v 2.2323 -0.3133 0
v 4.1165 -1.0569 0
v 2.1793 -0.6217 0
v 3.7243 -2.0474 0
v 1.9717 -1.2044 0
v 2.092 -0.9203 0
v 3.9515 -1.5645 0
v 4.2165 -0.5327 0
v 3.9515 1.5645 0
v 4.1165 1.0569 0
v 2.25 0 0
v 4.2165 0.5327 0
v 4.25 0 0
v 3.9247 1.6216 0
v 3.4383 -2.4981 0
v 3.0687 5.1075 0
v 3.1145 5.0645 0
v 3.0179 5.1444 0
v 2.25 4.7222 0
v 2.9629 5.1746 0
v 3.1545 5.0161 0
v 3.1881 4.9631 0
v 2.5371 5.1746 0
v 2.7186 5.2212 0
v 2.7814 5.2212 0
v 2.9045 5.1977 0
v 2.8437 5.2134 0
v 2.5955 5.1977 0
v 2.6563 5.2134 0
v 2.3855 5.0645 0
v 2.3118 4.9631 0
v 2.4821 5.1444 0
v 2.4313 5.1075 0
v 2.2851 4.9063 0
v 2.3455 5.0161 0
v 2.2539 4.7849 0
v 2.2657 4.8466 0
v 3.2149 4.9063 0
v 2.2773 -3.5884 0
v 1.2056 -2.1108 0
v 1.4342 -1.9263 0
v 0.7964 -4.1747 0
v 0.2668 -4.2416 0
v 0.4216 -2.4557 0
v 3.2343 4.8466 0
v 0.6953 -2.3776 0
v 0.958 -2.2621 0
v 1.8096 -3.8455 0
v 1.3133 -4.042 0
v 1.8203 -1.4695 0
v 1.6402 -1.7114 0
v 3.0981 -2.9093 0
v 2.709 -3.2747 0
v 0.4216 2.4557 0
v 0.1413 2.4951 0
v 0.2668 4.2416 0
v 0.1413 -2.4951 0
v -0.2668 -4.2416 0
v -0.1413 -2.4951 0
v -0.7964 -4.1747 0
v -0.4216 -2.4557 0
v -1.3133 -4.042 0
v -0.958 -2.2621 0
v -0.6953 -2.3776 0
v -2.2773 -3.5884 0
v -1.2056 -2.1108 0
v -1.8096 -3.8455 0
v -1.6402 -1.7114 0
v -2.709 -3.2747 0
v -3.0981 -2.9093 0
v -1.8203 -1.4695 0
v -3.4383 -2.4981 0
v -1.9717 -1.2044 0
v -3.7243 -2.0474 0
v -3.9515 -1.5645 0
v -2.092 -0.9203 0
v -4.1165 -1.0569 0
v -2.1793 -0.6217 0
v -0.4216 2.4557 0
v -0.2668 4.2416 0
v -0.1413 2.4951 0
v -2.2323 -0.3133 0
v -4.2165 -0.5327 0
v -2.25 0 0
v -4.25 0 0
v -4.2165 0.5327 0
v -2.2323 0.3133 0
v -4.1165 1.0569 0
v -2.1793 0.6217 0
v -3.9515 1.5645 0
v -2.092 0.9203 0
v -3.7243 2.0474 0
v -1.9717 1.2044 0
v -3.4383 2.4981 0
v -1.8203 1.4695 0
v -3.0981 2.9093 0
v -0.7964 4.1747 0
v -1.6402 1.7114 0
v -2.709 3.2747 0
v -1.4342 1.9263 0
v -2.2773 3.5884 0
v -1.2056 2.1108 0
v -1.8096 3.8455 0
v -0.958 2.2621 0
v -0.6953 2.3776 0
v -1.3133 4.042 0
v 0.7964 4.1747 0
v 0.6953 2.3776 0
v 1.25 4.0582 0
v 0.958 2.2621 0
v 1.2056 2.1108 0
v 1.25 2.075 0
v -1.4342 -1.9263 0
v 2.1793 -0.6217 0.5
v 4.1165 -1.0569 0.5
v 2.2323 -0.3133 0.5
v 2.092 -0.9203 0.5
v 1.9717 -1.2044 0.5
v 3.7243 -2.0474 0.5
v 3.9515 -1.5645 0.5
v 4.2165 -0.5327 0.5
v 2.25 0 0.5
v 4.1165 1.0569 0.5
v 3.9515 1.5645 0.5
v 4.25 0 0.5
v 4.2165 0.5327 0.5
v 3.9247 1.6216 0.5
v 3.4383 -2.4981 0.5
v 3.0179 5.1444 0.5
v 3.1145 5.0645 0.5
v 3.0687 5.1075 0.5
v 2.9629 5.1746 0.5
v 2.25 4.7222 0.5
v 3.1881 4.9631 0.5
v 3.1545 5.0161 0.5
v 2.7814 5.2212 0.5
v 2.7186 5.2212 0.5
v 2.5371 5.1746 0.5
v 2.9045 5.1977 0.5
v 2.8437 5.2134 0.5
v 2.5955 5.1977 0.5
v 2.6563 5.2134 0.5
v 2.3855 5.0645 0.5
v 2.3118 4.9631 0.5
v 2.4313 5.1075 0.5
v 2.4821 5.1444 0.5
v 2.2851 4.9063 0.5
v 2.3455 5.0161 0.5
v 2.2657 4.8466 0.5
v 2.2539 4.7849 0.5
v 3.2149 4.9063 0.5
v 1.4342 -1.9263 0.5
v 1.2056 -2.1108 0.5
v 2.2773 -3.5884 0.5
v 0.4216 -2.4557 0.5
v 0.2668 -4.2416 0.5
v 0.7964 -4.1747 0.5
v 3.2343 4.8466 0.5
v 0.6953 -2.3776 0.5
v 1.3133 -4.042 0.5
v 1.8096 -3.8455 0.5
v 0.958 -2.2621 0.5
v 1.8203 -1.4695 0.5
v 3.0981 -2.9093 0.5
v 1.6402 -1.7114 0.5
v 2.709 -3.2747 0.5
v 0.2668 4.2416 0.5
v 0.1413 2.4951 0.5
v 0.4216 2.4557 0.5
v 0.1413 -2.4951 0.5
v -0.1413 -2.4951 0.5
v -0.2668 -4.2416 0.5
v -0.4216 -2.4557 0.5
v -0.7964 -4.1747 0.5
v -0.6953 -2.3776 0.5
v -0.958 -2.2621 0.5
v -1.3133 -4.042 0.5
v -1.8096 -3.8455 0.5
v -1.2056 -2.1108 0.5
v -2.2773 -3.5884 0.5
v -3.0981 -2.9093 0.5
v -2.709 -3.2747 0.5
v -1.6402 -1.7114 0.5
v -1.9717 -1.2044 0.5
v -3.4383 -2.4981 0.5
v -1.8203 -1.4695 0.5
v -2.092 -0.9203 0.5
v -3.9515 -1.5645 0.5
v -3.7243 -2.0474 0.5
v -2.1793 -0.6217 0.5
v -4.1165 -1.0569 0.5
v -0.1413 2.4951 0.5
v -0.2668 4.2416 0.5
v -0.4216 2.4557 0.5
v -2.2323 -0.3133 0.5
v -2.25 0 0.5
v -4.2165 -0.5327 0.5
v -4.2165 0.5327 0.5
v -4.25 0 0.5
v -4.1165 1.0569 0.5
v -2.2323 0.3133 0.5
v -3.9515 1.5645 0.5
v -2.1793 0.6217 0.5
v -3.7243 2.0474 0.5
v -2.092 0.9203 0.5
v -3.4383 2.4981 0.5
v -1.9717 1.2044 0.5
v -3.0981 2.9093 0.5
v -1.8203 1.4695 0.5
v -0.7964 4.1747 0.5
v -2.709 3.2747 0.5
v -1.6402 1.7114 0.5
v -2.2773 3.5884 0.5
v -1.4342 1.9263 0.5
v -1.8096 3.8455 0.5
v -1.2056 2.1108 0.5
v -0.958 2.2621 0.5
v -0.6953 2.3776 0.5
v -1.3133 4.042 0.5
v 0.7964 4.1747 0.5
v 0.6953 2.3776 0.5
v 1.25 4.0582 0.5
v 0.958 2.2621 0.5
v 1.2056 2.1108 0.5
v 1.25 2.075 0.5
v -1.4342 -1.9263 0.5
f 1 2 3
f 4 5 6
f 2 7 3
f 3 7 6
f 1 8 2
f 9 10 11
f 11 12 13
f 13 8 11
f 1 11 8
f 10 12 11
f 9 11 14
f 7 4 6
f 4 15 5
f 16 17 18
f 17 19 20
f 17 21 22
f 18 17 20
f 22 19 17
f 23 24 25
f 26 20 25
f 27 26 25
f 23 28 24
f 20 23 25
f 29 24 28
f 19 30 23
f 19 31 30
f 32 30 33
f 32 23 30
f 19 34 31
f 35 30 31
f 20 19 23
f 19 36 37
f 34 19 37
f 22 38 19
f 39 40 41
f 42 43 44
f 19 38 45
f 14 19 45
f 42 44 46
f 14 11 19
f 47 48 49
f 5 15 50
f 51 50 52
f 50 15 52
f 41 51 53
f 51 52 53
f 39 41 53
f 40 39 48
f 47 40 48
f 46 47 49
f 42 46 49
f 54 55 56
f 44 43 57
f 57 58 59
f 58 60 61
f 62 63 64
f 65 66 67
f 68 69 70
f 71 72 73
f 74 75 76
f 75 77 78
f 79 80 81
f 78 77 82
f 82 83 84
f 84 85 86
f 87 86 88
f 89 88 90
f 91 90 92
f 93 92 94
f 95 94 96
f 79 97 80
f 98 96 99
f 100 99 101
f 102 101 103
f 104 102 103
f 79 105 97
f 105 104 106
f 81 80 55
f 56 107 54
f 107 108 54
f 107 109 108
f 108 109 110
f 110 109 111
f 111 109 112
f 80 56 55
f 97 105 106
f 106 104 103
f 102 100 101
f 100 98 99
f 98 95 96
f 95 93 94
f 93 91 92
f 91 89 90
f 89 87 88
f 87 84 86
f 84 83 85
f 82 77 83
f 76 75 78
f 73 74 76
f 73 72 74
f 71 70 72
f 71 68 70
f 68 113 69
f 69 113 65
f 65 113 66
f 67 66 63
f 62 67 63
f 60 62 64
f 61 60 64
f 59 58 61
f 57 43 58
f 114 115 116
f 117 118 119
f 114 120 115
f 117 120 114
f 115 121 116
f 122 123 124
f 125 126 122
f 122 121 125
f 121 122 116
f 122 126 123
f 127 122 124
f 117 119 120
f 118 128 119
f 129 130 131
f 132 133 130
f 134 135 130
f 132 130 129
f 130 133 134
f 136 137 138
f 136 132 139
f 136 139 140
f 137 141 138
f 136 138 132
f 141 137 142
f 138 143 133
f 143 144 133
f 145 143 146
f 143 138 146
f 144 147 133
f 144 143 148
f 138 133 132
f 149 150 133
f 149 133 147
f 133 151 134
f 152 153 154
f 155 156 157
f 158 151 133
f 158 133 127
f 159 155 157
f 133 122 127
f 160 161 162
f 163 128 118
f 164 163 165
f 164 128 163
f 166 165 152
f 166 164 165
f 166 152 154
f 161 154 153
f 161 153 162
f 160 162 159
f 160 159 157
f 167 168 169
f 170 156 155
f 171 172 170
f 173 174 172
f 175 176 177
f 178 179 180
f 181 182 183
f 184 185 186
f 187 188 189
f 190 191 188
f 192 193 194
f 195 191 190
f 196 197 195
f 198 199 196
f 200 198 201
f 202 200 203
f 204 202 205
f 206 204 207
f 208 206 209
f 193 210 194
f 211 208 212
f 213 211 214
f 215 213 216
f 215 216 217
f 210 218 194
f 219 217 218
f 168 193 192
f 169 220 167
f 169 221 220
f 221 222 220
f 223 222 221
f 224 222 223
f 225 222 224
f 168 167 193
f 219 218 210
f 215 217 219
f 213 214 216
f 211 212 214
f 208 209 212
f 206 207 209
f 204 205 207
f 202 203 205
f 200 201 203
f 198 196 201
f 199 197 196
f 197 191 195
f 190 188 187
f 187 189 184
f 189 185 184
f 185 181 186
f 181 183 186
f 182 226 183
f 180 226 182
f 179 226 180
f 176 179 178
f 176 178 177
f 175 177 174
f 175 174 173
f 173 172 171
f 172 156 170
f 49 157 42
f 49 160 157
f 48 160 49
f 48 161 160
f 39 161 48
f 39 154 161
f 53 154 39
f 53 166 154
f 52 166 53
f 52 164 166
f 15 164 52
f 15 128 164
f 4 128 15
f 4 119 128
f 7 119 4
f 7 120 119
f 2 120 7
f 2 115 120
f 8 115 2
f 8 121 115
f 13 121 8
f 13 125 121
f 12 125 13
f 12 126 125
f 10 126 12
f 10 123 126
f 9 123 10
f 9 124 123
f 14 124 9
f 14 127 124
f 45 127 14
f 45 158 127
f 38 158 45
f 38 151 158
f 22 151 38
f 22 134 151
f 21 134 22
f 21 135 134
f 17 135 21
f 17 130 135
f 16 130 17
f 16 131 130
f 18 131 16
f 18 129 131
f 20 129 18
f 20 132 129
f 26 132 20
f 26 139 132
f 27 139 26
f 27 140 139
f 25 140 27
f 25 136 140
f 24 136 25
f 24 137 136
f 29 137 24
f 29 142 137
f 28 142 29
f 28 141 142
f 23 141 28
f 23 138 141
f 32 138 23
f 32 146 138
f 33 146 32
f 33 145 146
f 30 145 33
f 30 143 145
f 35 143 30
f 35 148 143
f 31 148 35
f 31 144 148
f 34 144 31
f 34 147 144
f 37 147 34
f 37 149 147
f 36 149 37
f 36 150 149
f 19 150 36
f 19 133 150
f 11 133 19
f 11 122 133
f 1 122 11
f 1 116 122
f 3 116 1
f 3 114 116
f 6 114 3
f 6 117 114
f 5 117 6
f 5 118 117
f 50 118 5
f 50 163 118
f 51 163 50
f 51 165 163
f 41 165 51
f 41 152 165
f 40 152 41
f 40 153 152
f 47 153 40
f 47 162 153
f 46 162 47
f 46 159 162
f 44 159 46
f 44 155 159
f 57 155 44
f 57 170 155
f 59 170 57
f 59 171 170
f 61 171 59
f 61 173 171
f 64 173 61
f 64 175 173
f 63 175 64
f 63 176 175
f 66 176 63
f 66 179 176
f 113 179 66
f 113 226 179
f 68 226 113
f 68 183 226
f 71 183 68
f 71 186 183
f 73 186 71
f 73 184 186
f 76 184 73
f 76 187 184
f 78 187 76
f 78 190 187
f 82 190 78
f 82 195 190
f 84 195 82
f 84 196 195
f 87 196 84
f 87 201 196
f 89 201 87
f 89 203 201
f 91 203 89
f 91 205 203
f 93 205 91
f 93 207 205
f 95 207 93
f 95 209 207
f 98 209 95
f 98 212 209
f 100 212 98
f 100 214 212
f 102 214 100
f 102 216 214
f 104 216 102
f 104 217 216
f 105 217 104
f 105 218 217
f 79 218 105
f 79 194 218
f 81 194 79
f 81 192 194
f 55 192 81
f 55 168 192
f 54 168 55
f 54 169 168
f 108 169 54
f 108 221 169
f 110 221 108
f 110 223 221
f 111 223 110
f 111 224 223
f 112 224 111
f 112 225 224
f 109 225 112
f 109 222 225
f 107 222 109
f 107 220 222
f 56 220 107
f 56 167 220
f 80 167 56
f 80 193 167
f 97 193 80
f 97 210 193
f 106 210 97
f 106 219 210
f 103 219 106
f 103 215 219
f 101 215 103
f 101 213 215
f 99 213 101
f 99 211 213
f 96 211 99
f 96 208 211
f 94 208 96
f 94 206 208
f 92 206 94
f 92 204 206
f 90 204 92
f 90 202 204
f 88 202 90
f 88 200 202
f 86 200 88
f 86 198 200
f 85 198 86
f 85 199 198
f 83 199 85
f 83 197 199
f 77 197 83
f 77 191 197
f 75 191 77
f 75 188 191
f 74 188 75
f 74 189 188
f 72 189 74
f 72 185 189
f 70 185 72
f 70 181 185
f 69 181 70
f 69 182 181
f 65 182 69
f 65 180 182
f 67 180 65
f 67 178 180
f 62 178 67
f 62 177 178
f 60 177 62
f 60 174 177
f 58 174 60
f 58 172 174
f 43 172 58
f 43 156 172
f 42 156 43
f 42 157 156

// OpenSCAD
$fn = 50 + 0;

needle_size = 3.5; // [2.0:US 0 \ GB 14, 2.1:JP 0, 2.25:US 1 GB 13, 2.4:JP 1, 2.5:2.5 mm, 2.7:JP 2, 2.75:US 2 \ GB 12, 3.0:GB 11 \ JP 3, 3.25:US 3 \ GB 10, 3.3:JP 4, 3.5:US 4, 3.6:JP 5, 3.75:US 5 \ GB 9, 3.9:JP 6, 4.0:US 6 \ GB 8, 4.2:JP 7, 4.5:US 7 \ GB 7 \ JP 8, 4.8:JP 9, 5.0:US 8 \ GB 6, 5.1:JP 10, 5.4:JP 11, 5.5:US 9 \ GB 5, 5.7:JP 12, 6.0:US 10 \ GB 4 \ JP 13, 6.3:JP 14, 6.5:US 10 ½ \ GB 3, 6.6:JP 15, 7.0:GB 2 \ JP 7 mm, 7.5:GB 1, 8.0:US 11 \ GB 0 \ JP 8mm, 9.0:US 13 \ GB 00 \ JP 9mm, 10.0:US 15 \ GB  000 \ JP 10mm, 12.0:US 17, 16.0:US 19, 19.0:US 35, 25.0:US 50]
width = 2; // [2:10]
thickness = 0.5; // [0.5, 1.0, 1.5, 2.0, 2.5, 3.0]
clearance = 0.5 + 0;
radius = (needle_size / 2 + width + clearance) / 0.9;
slot_width = 1 + 0;

linear_extrude(height = thickness) {
	difference() {
		union() {
			circle(r=needle_size / 2 + width + clearance );

			hull() {
				translate([radius * 0.9 - width / 2, 0, 0]) circle(r=width / 2);
				translate([radius * 0.9 - width * 3 / 4, radius, 0]) circle(r=width / 4);
			}
		}
		scale([0.9, 1, 1]) circle(r=(needle_size / 2 + clearance) / 0.9);
		translate([radius * 0.9 - width - slot_width, 0, -1]) square([slot_width, radius]);
	}
}
